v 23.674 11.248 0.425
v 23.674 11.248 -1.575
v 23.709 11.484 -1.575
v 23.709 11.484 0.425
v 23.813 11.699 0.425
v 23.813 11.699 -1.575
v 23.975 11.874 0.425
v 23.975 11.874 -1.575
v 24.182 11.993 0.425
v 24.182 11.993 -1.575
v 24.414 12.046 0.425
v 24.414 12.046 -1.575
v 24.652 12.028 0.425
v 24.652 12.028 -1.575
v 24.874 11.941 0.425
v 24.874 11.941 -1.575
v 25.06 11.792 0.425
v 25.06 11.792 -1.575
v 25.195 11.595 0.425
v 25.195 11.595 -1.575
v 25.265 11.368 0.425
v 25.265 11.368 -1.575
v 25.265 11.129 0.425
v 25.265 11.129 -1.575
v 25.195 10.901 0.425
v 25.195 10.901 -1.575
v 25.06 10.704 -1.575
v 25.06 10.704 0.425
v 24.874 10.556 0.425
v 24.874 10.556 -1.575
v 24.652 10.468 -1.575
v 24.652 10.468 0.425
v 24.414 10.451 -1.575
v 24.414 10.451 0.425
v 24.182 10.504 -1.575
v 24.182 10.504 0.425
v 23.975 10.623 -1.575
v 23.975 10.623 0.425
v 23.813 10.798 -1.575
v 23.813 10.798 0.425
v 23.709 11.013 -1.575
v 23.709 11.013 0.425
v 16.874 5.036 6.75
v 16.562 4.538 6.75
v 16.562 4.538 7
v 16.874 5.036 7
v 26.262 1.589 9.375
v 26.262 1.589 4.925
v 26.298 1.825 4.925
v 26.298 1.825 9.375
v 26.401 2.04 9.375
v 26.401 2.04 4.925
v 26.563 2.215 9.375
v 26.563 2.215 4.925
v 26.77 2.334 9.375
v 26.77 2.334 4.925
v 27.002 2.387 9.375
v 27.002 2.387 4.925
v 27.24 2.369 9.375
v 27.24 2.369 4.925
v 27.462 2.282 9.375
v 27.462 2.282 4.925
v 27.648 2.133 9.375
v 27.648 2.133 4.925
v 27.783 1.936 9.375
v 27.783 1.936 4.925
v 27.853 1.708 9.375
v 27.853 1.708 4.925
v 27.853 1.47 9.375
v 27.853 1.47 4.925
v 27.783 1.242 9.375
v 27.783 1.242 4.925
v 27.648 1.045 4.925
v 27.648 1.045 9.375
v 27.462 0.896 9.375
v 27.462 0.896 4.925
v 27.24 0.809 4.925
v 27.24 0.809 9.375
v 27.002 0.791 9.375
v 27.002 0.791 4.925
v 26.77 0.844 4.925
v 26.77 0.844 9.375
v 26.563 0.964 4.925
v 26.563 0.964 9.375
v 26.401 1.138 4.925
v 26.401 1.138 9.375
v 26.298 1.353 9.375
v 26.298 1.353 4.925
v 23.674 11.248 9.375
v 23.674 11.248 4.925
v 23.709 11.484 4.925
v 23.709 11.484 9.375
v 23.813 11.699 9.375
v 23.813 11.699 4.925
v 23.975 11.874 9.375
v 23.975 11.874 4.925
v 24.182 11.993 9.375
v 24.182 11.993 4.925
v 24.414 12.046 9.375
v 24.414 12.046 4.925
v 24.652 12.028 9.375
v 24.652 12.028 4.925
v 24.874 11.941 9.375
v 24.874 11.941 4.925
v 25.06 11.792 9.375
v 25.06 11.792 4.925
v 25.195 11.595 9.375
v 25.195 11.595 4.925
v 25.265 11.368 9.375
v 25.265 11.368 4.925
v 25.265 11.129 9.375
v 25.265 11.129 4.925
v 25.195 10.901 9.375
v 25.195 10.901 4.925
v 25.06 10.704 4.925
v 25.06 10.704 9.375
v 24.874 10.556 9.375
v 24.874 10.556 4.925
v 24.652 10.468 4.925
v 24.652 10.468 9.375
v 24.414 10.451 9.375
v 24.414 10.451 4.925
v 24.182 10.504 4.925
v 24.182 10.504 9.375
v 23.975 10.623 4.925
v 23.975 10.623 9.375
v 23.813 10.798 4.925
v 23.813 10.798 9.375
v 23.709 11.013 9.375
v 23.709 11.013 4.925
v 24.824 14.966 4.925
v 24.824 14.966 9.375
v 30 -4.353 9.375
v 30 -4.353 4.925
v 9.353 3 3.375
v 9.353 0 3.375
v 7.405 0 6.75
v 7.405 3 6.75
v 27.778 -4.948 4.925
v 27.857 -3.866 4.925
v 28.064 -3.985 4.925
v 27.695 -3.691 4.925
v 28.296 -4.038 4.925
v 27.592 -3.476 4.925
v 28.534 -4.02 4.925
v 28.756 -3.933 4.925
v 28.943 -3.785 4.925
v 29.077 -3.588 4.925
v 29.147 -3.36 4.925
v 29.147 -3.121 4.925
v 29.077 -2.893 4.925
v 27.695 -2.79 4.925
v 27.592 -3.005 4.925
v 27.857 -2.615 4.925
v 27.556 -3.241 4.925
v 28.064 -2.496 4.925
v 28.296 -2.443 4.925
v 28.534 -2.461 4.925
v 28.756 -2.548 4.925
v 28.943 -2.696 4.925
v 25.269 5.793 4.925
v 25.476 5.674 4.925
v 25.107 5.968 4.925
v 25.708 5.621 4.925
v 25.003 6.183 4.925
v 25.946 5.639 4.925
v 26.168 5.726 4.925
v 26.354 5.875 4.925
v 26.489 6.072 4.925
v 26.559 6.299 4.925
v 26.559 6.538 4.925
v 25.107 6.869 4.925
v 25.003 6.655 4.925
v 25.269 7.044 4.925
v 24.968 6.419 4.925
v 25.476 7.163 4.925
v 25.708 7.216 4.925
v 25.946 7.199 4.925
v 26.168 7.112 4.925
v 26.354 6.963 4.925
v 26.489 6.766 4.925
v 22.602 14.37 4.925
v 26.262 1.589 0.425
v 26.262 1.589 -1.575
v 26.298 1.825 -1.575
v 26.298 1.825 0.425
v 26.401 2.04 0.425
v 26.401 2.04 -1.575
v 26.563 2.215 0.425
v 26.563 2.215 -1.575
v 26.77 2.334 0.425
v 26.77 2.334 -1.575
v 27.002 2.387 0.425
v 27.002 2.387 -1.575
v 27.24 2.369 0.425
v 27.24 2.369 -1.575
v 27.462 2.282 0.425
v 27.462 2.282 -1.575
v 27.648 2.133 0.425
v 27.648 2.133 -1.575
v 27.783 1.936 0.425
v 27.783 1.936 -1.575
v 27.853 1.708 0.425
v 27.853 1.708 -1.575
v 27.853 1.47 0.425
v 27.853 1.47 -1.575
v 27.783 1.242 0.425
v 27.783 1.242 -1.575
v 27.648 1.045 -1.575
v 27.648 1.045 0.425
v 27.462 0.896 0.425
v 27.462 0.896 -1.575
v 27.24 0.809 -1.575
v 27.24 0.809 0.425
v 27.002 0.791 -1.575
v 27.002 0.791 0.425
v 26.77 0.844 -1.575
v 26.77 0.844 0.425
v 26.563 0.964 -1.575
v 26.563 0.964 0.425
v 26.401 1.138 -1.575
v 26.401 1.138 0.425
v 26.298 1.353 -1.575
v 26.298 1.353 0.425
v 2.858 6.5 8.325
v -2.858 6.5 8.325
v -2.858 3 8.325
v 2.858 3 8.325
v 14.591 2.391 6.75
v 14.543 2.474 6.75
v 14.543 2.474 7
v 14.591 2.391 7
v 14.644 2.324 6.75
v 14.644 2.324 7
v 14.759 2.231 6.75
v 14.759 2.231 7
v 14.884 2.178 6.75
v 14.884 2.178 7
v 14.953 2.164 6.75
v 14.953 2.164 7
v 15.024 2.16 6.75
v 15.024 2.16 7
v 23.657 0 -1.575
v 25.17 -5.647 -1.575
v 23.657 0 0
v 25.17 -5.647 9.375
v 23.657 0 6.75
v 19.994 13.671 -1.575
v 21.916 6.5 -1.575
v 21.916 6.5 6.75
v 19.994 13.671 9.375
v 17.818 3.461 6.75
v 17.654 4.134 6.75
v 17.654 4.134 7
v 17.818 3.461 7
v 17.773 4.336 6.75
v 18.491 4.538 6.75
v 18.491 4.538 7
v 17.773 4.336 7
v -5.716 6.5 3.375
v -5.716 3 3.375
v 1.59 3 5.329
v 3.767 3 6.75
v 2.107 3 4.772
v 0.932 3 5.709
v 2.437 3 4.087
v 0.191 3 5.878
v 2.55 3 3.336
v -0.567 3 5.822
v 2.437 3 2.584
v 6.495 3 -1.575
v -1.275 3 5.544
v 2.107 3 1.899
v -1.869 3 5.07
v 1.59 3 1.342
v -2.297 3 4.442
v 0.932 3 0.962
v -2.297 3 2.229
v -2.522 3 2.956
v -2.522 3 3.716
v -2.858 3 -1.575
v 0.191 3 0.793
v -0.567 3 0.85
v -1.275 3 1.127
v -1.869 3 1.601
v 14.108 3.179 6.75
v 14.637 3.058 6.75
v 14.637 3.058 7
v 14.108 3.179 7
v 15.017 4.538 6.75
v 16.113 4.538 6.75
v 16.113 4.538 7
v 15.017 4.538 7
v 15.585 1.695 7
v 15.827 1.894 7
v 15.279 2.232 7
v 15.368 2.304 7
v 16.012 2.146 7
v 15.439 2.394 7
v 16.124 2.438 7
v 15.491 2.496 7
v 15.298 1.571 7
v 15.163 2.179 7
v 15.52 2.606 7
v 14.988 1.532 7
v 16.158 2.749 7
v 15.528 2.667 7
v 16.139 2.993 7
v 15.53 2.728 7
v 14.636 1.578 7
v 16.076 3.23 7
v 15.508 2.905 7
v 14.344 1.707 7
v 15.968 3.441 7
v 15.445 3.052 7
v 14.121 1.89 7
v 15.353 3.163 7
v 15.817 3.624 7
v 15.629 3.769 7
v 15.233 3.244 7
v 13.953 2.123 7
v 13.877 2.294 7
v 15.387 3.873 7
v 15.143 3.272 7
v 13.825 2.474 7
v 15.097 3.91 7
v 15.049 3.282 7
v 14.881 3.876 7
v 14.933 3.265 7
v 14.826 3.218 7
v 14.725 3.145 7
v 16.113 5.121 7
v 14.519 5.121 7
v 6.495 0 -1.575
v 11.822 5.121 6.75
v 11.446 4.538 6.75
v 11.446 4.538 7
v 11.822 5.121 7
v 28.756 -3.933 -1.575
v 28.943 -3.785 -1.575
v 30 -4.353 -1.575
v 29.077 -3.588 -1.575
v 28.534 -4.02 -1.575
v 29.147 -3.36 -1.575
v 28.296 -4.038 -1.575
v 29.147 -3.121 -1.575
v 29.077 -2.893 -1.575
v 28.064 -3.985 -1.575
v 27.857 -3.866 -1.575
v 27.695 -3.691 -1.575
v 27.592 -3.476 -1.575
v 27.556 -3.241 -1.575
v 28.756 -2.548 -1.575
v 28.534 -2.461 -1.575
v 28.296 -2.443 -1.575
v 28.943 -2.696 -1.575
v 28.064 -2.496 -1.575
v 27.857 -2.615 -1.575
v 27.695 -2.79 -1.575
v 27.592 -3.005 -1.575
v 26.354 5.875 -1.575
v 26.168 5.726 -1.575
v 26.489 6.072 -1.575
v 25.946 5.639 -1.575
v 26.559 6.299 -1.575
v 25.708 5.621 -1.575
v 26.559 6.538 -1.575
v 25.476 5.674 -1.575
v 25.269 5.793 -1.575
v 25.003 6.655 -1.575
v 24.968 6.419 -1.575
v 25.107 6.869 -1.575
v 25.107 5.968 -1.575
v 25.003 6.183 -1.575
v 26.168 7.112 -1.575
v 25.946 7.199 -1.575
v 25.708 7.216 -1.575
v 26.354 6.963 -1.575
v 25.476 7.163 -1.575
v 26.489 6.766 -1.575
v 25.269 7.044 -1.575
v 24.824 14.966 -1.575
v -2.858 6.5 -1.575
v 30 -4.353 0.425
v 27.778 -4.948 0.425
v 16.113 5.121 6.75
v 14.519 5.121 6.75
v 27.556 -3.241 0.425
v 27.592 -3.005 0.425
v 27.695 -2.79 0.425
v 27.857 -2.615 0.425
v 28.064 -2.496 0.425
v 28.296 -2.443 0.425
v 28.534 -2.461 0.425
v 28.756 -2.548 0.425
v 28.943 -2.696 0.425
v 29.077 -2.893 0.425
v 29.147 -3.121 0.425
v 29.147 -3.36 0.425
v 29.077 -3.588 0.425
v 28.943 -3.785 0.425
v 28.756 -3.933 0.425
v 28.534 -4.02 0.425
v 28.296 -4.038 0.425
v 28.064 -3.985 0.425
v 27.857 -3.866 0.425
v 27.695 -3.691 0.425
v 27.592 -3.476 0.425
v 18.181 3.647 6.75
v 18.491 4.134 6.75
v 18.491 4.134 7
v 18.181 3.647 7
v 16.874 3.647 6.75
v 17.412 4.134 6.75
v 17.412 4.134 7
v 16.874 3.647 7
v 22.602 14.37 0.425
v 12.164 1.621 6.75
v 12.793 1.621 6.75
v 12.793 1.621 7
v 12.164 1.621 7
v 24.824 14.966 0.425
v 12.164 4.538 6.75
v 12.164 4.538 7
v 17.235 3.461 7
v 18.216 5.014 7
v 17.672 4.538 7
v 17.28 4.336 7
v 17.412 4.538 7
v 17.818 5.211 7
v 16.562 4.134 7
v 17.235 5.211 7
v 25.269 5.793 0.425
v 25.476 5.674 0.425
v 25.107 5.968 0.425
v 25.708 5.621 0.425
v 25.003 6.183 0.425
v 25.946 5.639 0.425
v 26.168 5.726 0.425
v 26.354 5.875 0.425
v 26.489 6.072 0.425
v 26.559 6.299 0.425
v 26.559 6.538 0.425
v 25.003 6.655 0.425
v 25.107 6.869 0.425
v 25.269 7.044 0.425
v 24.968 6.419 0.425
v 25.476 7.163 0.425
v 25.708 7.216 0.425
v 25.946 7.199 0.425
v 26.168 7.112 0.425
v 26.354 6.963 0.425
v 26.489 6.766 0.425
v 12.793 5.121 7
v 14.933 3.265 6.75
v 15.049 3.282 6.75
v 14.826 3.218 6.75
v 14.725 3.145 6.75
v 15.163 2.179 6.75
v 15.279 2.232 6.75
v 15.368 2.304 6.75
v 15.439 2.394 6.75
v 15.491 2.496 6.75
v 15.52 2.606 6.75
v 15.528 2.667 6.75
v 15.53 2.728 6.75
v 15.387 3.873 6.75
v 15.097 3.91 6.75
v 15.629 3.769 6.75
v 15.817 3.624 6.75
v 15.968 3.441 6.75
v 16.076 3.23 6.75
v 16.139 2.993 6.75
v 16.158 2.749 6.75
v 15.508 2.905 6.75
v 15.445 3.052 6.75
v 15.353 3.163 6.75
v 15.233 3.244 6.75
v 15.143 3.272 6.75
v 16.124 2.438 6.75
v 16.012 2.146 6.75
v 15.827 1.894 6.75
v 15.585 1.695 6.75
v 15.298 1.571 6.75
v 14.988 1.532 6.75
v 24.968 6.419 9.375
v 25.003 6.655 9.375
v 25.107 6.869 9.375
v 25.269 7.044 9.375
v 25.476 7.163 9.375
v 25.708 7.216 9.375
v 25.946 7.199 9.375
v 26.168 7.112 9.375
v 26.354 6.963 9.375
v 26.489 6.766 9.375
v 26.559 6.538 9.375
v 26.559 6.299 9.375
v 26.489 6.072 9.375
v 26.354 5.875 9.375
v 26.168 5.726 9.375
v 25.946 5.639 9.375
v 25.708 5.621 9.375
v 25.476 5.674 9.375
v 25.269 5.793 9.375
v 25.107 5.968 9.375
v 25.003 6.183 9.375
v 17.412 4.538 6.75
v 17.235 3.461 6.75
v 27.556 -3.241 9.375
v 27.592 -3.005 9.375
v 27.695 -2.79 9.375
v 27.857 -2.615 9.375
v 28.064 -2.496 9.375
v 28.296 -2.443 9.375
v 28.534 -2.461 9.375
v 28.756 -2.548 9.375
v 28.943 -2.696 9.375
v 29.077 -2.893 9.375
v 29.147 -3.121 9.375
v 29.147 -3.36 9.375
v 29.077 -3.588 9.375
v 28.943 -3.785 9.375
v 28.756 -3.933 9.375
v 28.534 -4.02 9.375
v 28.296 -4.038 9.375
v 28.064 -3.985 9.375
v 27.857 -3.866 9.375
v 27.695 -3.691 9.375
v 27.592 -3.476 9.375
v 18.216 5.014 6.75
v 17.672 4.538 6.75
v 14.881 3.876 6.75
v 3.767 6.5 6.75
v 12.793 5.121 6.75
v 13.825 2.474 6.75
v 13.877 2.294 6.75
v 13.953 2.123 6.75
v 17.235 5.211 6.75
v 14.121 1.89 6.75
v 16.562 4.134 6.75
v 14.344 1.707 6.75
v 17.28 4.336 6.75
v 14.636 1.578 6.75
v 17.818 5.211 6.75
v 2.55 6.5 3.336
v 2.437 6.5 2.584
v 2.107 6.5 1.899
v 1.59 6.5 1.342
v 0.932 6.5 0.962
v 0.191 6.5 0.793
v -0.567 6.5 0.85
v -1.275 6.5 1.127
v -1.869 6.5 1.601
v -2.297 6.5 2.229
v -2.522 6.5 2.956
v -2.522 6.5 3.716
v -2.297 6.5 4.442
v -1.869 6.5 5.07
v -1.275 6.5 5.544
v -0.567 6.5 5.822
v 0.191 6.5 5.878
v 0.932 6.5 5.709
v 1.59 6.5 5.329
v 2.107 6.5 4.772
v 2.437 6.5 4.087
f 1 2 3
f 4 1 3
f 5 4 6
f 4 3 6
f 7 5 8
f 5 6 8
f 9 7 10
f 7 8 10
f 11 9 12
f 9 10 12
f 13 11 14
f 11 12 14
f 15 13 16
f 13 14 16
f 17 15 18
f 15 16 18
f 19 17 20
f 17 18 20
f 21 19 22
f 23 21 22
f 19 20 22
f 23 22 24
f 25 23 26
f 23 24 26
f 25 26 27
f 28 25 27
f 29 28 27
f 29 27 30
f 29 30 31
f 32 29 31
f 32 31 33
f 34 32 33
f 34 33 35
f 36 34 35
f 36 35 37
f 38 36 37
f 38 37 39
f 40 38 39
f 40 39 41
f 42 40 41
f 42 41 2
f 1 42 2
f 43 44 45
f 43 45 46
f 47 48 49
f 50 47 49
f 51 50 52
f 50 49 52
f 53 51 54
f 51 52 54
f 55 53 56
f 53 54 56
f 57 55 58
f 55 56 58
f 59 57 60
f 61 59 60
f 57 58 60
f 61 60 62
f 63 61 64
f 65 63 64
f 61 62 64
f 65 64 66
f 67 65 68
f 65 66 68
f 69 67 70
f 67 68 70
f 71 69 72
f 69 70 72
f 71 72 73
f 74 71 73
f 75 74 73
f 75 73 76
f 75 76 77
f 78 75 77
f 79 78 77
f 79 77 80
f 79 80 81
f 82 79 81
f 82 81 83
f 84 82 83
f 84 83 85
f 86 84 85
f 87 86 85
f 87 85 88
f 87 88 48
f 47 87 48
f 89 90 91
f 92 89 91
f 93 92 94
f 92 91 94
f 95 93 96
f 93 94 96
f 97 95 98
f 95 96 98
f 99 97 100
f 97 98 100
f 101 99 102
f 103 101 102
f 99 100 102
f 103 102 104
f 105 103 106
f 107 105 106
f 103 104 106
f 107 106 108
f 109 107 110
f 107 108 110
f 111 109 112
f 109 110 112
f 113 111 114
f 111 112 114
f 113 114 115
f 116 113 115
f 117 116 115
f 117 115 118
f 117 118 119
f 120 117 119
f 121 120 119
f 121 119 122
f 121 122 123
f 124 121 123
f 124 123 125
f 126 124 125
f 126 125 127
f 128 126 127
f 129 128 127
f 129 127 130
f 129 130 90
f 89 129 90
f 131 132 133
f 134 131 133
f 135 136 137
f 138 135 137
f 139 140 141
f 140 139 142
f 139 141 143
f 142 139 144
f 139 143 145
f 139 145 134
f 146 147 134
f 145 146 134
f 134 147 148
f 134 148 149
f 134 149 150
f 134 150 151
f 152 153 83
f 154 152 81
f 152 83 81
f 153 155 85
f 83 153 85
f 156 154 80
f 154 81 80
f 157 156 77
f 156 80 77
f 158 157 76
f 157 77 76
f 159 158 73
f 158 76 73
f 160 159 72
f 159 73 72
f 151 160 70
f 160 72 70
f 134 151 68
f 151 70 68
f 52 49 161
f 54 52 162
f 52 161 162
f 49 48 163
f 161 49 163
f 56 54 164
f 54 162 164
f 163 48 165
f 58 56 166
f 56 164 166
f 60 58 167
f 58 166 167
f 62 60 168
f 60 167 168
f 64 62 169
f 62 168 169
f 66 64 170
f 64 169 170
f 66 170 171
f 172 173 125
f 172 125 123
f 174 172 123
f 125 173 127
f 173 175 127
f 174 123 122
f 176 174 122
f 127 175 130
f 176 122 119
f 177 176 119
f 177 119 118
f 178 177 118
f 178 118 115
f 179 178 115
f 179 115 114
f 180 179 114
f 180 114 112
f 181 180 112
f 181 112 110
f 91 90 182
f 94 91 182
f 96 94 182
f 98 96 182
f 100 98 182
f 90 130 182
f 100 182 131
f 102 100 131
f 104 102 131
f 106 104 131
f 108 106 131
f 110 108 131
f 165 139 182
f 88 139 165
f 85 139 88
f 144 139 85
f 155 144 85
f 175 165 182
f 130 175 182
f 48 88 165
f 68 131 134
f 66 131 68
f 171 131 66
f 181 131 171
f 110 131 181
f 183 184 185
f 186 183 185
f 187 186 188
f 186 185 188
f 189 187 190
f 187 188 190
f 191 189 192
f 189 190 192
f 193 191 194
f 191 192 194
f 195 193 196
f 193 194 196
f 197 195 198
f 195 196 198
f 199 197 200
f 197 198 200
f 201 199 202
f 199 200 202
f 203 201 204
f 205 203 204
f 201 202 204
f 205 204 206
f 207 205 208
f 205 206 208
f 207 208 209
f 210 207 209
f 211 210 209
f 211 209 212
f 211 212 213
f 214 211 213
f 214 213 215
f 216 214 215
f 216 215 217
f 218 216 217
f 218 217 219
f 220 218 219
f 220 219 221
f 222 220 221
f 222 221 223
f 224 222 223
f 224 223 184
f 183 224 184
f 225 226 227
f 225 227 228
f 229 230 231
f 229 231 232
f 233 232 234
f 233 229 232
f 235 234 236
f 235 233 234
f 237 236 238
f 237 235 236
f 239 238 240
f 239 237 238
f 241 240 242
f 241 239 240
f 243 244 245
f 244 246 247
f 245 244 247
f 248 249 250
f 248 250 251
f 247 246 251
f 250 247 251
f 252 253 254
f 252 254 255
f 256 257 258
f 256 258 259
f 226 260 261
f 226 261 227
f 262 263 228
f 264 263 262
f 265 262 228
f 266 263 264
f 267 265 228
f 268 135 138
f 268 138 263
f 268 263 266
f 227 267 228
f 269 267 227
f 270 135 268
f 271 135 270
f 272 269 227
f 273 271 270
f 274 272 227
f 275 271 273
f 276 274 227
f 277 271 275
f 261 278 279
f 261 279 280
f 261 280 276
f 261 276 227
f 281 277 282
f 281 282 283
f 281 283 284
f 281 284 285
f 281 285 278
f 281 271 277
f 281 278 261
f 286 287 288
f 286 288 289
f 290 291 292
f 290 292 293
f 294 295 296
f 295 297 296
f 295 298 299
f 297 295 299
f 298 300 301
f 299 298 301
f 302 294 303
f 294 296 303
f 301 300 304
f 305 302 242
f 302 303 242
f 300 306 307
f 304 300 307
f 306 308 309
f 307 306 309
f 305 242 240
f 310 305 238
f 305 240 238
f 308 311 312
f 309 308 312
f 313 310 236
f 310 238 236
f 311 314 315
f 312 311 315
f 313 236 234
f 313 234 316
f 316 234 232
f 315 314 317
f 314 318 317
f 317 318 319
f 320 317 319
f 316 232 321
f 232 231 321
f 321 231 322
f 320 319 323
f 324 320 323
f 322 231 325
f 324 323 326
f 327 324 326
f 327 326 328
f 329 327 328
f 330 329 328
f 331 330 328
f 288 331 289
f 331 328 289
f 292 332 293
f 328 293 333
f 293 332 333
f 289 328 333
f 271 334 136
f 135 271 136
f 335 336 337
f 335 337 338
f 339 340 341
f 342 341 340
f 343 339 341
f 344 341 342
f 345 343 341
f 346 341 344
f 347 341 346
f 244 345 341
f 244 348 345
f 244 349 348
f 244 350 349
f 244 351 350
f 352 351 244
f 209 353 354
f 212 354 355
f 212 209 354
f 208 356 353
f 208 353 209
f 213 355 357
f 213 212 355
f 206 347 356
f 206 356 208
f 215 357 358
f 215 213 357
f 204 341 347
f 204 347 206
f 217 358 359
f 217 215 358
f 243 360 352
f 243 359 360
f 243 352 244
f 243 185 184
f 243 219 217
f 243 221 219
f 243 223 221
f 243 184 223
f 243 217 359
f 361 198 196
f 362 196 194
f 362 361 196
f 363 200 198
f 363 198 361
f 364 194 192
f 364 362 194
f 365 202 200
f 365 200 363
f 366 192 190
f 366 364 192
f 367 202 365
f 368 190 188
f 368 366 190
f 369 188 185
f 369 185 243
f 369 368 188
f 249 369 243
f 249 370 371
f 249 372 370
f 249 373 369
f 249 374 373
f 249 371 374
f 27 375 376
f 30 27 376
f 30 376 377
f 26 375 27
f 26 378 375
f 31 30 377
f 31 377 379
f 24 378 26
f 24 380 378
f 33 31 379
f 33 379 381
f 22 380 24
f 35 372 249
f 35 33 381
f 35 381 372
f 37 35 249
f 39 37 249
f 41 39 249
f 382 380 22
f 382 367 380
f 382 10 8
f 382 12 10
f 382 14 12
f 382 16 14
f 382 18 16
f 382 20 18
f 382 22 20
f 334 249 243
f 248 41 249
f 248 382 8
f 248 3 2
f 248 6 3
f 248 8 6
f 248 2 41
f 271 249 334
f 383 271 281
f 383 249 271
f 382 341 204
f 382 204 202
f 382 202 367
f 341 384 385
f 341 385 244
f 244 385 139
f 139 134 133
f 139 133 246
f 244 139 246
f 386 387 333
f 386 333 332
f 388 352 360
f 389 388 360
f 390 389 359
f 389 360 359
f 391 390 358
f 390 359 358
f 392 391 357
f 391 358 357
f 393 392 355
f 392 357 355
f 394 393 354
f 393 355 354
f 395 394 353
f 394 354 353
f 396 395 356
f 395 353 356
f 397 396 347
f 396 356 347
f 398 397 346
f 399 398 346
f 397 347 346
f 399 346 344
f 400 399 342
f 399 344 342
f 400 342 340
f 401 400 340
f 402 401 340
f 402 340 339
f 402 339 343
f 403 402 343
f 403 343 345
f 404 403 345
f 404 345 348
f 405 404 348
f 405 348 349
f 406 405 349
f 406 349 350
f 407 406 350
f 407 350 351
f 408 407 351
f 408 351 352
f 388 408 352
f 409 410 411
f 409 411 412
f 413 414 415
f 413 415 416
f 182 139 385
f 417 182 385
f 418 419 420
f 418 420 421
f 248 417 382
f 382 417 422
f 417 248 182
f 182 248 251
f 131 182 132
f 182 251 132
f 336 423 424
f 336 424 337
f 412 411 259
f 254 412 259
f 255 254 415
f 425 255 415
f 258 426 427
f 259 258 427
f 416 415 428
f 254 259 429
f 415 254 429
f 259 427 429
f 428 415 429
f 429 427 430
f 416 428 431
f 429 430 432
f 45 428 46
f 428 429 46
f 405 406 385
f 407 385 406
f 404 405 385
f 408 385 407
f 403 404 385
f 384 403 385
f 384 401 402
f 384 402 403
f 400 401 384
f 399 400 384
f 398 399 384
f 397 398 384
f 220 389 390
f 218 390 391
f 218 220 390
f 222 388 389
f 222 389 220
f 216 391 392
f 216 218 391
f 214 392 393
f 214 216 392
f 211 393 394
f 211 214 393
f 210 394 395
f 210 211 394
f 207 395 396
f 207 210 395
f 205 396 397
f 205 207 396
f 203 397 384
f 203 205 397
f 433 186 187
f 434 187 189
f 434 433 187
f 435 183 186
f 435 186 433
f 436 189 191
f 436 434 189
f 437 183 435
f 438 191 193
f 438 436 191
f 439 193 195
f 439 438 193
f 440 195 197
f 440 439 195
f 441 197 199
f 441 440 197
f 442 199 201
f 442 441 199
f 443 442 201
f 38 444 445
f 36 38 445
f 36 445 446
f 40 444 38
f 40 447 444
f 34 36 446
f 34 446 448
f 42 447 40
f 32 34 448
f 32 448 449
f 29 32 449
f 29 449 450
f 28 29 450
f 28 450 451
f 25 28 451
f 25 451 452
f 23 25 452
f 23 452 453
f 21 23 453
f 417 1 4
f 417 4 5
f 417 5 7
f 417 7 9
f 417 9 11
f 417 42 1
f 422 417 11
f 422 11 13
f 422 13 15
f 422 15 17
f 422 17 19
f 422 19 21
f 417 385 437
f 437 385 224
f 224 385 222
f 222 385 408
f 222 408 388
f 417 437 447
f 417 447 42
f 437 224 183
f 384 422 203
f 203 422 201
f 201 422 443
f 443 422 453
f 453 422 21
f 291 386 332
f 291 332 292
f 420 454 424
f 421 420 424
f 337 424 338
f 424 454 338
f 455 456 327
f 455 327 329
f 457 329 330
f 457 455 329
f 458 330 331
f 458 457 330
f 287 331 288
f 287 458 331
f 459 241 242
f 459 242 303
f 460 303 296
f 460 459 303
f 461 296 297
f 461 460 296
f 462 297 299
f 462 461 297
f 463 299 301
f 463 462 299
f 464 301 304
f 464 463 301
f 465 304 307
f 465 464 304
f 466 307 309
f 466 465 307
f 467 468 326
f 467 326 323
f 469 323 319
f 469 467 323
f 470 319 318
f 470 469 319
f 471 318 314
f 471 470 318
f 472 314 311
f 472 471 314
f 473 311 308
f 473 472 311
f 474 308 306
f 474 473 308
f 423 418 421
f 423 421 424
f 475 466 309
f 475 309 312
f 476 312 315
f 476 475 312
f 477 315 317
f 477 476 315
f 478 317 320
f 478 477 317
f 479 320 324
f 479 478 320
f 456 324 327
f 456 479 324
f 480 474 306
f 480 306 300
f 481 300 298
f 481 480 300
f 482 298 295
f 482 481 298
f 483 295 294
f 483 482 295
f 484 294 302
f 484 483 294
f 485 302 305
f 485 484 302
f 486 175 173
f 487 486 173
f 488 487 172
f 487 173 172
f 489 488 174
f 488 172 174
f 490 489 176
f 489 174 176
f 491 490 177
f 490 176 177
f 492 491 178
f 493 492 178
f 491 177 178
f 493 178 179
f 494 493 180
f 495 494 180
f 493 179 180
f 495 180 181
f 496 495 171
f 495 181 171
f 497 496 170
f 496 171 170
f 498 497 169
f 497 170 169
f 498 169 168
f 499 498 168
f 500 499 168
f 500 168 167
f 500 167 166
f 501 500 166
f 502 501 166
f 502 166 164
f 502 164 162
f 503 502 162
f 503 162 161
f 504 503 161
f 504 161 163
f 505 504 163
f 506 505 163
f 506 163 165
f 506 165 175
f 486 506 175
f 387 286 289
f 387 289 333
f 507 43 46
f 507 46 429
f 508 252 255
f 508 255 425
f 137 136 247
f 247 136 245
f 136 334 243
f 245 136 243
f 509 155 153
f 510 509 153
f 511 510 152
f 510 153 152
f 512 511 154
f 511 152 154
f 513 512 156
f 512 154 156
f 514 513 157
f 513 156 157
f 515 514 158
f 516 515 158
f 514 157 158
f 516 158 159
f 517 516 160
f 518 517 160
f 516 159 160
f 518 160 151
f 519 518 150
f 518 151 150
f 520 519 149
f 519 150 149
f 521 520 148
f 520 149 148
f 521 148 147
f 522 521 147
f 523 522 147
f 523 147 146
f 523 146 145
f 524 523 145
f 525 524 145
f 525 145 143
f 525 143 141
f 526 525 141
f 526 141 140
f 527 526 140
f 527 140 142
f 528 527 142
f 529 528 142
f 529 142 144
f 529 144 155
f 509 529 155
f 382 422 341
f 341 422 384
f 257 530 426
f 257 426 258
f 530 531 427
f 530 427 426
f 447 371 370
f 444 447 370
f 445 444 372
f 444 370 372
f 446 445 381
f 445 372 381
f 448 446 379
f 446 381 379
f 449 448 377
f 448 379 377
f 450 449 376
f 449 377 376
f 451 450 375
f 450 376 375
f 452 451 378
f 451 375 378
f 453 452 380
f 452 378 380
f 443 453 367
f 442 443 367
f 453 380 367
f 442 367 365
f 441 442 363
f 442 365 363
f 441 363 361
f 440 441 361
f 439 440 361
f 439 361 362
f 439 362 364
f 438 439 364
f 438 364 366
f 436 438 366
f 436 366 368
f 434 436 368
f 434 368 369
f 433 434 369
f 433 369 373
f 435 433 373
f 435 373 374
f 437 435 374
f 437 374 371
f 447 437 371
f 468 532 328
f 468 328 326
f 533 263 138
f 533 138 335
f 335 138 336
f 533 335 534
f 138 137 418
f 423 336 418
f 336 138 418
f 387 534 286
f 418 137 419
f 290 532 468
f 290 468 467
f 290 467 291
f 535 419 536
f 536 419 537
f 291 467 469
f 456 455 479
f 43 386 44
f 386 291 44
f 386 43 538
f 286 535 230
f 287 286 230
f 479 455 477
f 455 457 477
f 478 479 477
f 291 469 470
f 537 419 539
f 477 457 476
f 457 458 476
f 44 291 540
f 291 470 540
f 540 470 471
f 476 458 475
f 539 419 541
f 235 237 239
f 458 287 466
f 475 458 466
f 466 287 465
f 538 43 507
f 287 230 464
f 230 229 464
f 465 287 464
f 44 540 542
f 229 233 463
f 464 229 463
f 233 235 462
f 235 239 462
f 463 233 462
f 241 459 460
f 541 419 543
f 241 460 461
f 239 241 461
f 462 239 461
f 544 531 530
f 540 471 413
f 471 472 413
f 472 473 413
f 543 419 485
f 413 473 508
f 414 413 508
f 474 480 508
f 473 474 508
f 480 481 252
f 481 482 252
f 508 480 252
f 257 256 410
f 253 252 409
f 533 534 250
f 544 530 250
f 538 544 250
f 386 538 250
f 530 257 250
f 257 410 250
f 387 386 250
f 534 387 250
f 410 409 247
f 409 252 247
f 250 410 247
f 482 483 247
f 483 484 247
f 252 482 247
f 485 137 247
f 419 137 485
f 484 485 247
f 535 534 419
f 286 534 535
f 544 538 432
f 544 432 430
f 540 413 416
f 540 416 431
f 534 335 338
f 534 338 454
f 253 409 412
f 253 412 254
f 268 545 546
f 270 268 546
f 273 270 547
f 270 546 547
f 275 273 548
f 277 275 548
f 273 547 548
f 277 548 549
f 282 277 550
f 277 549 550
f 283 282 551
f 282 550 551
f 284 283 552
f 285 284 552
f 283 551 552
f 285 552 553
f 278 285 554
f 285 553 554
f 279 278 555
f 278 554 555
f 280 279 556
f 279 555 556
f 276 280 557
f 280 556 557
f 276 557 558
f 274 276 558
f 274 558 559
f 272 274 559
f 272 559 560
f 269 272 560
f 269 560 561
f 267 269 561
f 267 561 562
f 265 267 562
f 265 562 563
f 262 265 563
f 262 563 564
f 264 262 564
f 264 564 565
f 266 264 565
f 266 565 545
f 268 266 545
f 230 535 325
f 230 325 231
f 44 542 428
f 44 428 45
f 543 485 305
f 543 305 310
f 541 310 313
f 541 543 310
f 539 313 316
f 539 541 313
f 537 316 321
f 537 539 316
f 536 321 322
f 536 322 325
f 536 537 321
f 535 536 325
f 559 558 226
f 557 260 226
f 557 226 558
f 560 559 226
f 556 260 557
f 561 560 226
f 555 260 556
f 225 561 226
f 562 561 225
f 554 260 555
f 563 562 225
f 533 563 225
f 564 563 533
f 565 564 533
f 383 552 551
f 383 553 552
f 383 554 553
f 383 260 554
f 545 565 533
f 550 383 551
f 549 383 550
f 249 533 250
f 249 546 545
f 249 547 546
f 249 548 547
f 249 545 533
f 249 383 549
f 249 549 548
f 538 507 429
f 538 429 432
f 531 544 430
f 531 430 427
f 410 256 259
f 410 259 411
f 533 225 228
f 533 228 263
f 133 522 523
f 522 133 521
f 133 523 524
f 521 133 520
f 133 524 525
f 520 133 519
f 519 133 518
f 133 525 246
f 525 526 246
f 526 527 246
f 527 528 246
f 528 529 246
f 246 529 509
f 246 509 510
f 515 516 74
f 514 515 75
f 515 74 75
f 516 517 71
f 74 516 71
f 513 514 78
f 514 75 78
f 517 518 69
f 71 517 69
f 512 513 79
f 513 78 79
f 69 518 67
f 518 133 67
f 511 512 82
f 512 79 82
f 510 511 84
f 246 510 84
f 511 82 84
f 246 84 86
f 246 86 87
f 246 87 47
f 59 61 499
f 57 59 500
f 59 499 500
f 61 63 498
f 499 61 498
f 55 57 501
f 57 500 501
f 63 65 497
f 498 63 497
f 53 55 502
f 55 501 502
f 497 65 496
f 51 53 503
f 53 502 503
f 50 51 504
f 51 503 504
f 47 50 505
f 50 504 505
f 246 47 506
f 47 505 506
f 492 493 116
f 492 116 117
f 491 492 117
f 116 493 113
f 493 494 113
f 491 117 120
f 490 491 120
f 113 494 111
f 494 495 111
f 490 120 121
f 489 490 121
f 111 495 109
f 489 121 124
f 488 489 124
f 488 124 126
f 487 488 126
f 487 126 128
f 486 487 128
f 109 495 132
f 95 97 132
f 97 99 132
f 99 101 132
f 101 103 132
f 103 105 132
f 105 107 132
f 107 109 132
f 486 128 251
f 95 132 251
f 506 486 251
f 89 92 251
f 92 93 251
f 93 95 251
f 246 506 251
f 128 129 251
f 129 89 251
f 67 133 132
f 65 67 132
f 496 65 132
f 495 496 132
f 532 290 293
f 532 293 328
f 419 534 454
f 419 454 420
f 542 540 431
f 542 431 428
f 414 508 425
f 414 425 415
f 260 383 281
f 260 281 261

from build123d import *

# Parameters (mm, degrees)
SKETCH1_W                = 25
SKETCH1_H                = 6.75
BOSS_EXTRUDE1_DEPTH      = 6.5
BOSS_EXTRUDE4_DEPTH      = 6.5
BOSS_EXTRUDE3_DEPTH      = 6
BOSS_EXTRUDE3_DEPTH_BACK = 4.95
SKETCH4_W                = 2.3
SKETCH4_H                = 4.5
CUT_EXTRUDE1_DEPTH       = 23
SKETCH6_R                = 2.55
CUT_EXTRUDE2_DEPTH       = 10
BOSS_EXTRUDE5_DEPTH      = 1.575
CUT_EXTRUDE3_DEPTH       = 3
SKETCH9_R                = 0.8
CUT_EXTRUDE4_DEPTH       = 10.95
BOSS_EXTRUDE6_DEPTH      = 0.25


with BuildPart() as part:
    # Sketch1 → Boss-Extrude1 (new body)
    with BuildSketch(Plane(origin=(0, 0, 0), x_dir=(1, 0, 0), z_dir=(0, 1, 0))):
        with Locations((12.5, -3.375)):
            Rectangle(SKETCH1_W, SKETCH1_H)
    extrude(amount=BOSS_EXTRUDE1_DEPTH)

    # Sketch5 → Boss-Extrude4 (add)
    with BuildSketch(Plane(origin=(0, 6.5, 0), x_dir=(1, 0, 0), z_dir=(0, 1, 0))):
        Polygon((-5.715767665, -3.375), (-2.857883832, -8.325), (2.857883832, -8.325), (5.715767665, -3.375), (2.857883832, 1.575), (-2.857883832, 1.575), align=None)
    extrude(amount=-BOSS_EXTRUDE4_DEPTH)

    # Sketch3 → Boss-Extrude3 (add, two sides)
    with BuildSketch(Plane.XY.offset(3.375)) as boss_extrude3_sk:
        Polygon((19.993989967, 13.671468913), (24.823619098, 14.965564139), (30, -4.352952387), (25.170370869, -5.647047613), align=None)
    extrude(amount=BOSS_EXTRUDE3_DEPTH)
    extrude(boss_extrude3_sk.sketch, amount=-BOSS_EXTRUDE3_DEPTH_BACK)

    # Sketch4 → Cut-Extrude1 (cut)
    with BuildSketch(Plane(origin=(-2.078523862, 7.757156658, 0), x_dir=(0.965925826, 0.258819045, 0), z_dir=(-0.258819045, 0.965925826, 0))):
        with Locations((26.701147808, -2.675)):
            Rectangle(SKETCH4_W, SKETCH4_H)
    extrude(amount=-CUT_EXTRUDE1_DEPTH, mode=Mode.SUBTRACT)

    # Sketch6 → Cut-Extrude2 (cut)
    with BuildSketch(Plane(origin=(0, 6.5, 0), x_dir=(1, 0, 0), z_dir=(0, 1, 0))):
        with Locations((0, -3.335615973)):
            Circle(SKETCH6_R)
    extrude(amount=-CUT_EXTRUDE2_DEPTH, mode=Mode.SUBTRACT)

    # Sketch7 → Boss-Extrude5 (add)
    with BuildSketch(Plane(origin=(0, 0, -1.575), x_dir=(-1, 0, 0), z_dir=(0, 0, -1))):
        Polygon((-2.857883832, 0), (-23.657249021, 0), (-25.170370869, -5.647047613), (-30, -4.352952387), (-24.823619098, 14.965564139), (-19.993989967, 13.671468913), (-21.91557927, 6.5), (-2.857883832, 6.5), align=None)
    extrude(amount=-BOSS_EXTRUDE5_DEPTH)

    # Sketch8 → Cut-Extrude3 (cut)
    with BuildSketch(Plane(origin=(0, 0, 0), x_dir=(-1, 0, 0), z_dir=(0, -1, 0))):
        Polygon((-4.67653718, -11.475), (4.67653718, -11.475), (9.353074361, -3.375), (4.67653718, 4.725), (-4.67653718, 4.725), (-9.353074361, -3.375), align=None)
    extrude(amount=-CUT_EXTRUDE3_DEPTH, mode=Mode.SUBTRACT)

    # Sketch9 → Cut-Extrude4 (cut)
    with BuildSketch(Plane(origin=(0, 0, -1.575), x_dir=(-1, 0, 0), z_dir=(0, 0, -1))):
        with Locations((-28.356067858, -3.240528406)):
            Circle(SKETCH9_R)
        with Locations((-27.061972633, 1.589100725)):
            Circle(SKETCH9_R)
        with Locations((-25.767877407, 6.418729856)):
            Circle(SKETCH9_R)
        with Locations((-24.473782182, 11.248358988)):
            Circle(SKETCH9_R)
    extrude(amount=-CUT_EXTRUDE4_DEPTH, mode=Mode.SUBTRACT)

    # Sketch10 → Boss-Extrude6 (add)
    with BuildSketch(Plane.XY.offset(6.75)):
        Polygon((11.821517388, 5.121255448), (12.792571074, 5.121255448), (12.792571074, 1.621255448), (12.164365946, 1.621255448), (12.164365946, 4.537922115), (11.446417228, 4.537922115), align=None)
        with BuildLine():
            Line((14.519434055, 5.121255448), (16.113083895, 5.121255448))
            Line((16.113083895, 5.121255448), (16.113083895, 4.537922115))
            Line((16.113083895, 4.537922115), (15.017230529, 4.537922115))
            Line((15.017230529, 4.537922115), (14.880511779, 3.876063141))
            add(Edge.make_bspline(
                [(14.880511779, 3.876063141), (14.899141666, 3.881251799), (14.93588363, 3.8914849), (14.991235445, 3.901747406), (15.044879068, 3.908399236), (15.080079686, 3.909286501), (15.097158414, 3.909716987)],
                knots=[0, 0, 0, 0, 5.799e-05, 0.000114368, 0.000168722, 0.000219947, 0.000219947, 0.000219947, 0.000219947], degree=3))
            add(Edge.make_bspline(
                [(15.097158414, 3.909716987), (15.134374752, 3.908864196), (15.207736352, 3.907183157), (15.315055064, 3.891224618), (15.41781907, 3.866090403), (15.515713902, 3.830243826), (15.608643929, 3.78358858), (15.696721801, 3.727148811), (15.780055618, 3.66082539), (15.857165021, 3.584576793), (15.928016362, 3.500854107), (15.989617562, 3.410299164), (16.042228831, 3.314203188), (16.084074015, 3.211968849), (16.117101802, 3.104238248), (16.140968418, 2.990942348), (16.15508194, 2.871946875), (16.156985062, 2.790764772), (16.157955689, 2.749360416)],
                knots=[0, 0, 0, 0, 0.000111586, 0.000219961, 0.00032471, 0.000428519, 0.000531991, 0.000636043, 0.000741817, 0.000850891, 0.00096086, 0.001070345, 0.001178899, 0.001288921, 0.00140114, 0.00151651, 0.001635827, 0.001760022, 0.001760022, 0.001760022, 0.001760022], degree=3))
            add(Edge.make_bspline(
                [(16.157955689, 2.749360416), (16.156769568, 2.707486025), (16.154429003, 2.62485561), (16.139158961, 2.503359672), (16.112207063, 2.386993992), (16.075185934, 2.275447061), (16.026412967, 2.169538723), (15.967756798, 2.068171845), (15.898225712, 1.972098843), (15.818502044, 1.882304581), (15.73183196, 1.800230902), (15.639548779, 1.728030529), (15.54230082, 1.6672745), (15.440085734, 1.618173357), (15.333489963, 1.579325407), (15.222481155, 1.551045953), (15.106519819, 1.534829258), (15.027797139, 1.53262981), (14.987783414, 1.531511859)],
                knots=[0, 0, 0, 0, 0.000125626, 0.000247897, 0.00036661, 0.000483454, 0.000599853, 0.000715778, 0.000834286, 0.000954987, 0.001075509, 0.001191914, 0.001305919, 0.001418808, 0.001531482, 0.001645754, 0.001761863, 0.001881886, 0.001881886, 0.001881886, 0.001881886], degree=3))
            add(Edge.make_bspline(
                [(14.987783414, 1.531511859), (14.95200033, 1.532426412), (14.881428601, 1.534230104), (14.777479542, 1.545316541), (14.677261106, 1.564917466), (14.581305344, 1.593285081), (14.488602639, 1.628199138), (14.400224662, 1.671865764), (14.315685761, 1.723453489), (14.235225994, 1.782020834), (14.160152719, 1.847994677), (14.091633788, 1.920214415), (14.029254379, 1.997769753), (13.974349314, 2.08161749), (13.927090704, 2.171633744), (13.885180804, 2.266757653), (13.850877131, 2.367982614), (13.833469005, 2.438157381), (13.824622356, 2.473819551)],
                knots=[0, 0, 0, 0, 0.000107354, 0.000211725, 0.000313201, 0.000413265, 0.000511575, 0.000610032, 0.000708511, 0.000808359, 0.000908217, 0.001007897, 0.001106663, 0.001206422, 0.001308044, 0.00141134, 0.001517986, 0.001628185, 0.001628185, 0.001628185, 0.001628185], degree=3))
            Line((13.824622356, 2.473819551), (14.542571074, 2.473819551))
            add(Edge.make_bspline(
                [(14.542571074, 2.473819551), (14.555695194, 2.44910712), (14.581200423, 2.401081329), (14.629717008, 2.337319877), (14.684028245, 2.282946849), (14.743644216, 2.23743101), (14.808951196, 2.203331319), (14.87728805, 2.17747169), (14.949513264, 2.162528368), (14.998701823, 2.160660305), (15.023540625, 2.159716987)],
                knots=[0, 0, 0, 0, 8.3833e-05, 0.00016292, 0.000239268, 0.000313868, 0.00038695, 0.000459491, 0.000532506, 0.000606986, 0.000606986, 0.000606986, 0.000606986], degree=3))
            add(Edge.make_bspline(
                [(15.023540625, 2.159716987), (15.040852937, 2.160368356), (15.074915202, 2.161649936), (15.125100563, 2.168429817), (15.173004696, 2.181270757), (15.218983754, 2.199052474), (15.263161251, 2.221228283), (15.304903887, 2.249223798), (15.344937907, 2.281447673), (15.382653832, 2.318424679), (15.416813589, 2.35964544), (15.44676796, 2.403939957), (15.473551298, 2.450323998), (15.493390125, 2.500634949), (15.509636448, 2.553370509), (15.521600897, 2.608928478), (15.528751005, 2.667373743), (15.529412913, 2.707272687), (15.529750561, 2.727625641)],
                knots=[0, 0, 0, 0, 5.1959e-05, 0.00010223, 0.000151548, 0.000200376, 0.000249918, 0.000299504, 0.000350859, 0.000403908, 0.00045768, 0.000511159, 0.000564208, 0.00061798, 0.000672982, 0.000729638, 0.000788252, 0.000849286, 0.000849286, 0.000849286, 0.000849286], degree=3))
            add(Edge.make_bspline(
                [(15.529750561, 2.727625641), (15.529358682, 2.747506156), (15.528595879, 2.786204063), (15.52228582, 2.843026451), (15.510997246, 2.896940614), (15.495616468, 2.948359494), (15.475927235, 2.996970851), (15.451865677, 3.043064042), (15.423328999, 3.086406084), (15.390163995, 3.126114575), (15.354797176, 3.162536333), (15.316801847, 3.194390511), (15.276520328, 3.220827268), (15.235204316, 3.243907326), (15.191204624, 3.260704489), (15.14551063, 3.272272075), (15.098170386, 3.280759905), (15.065880633, 3.281258596), (15.049482132, 3.281511859)],
                knots=[0, 0, 0, 0, 5.9632e-05, 0.000116076, 0.000171216, 0.000224671, 0.00027688, 0.000328311, 0.000380426, 0.000432223, 0.00048329, 0.000532573, 0.000580604, 0.000627663, 0.000674276, 0.000721381, 0.000768985, 0.000818109, 0.000818109, 0.000818109, 0.000818109], degree=3))
            add(Edge.make_bspline(
                [(15.049482132, 3.281511859), (15.031669548, 3.28083597), (14.995969309, 3.279481344), (14.942927689, 3.268459116), (14.890525603, 3.250621017), (14.838471643, 3.226010532), (14.787282533, 3.193803172), (14.735607368, 3.156027632), (14.685175827, 3.10993916), (14.65311005, 3.075612361), (14.636521395, 3.057854006)],
                knots=[0, 0, 0, 0, 5.34e-05, 0.000107026, 0.00016179, 0.000219183, 0.000279308, 0.000342972, 0.00041098, 0.000483874, 0.000483874, 0.000483874, 0.000483874], degree=3))
            Line((14.636521395, 3.057854006), (14.107875561, 3.179148077))
            Line((14.107875561, 3.179148077), (14.519434055, 5.121255448))
        make_face()
        Polygon((17.234878766, 5.210999038), (17.8182121, 5.210999038), (17.672378766, 4.537922115), (18.215748157, 5.013983814), (18.491289023, 4.537922115), (17.773340305, 4.335999038), (18.491289023, 4.134075961), (18.180692068, 3.647497435), (17.6541496, 4.134075961), (17.8182121, 3.460999038), (17.234878766, 3.460999038), (17.412262581, 4.134075961), (16.873801042, 3.647497435), (16.561801843, 4.134075961), (17.279750561, 4.335999038), (16.561801843, 4.537922115), (16.873801042, 5.036419711), (17.412262581, 4.537922115), align=None)
    extrude(amount=BOSS_EXTRUDE6_DEPTH)


solid = part.part
